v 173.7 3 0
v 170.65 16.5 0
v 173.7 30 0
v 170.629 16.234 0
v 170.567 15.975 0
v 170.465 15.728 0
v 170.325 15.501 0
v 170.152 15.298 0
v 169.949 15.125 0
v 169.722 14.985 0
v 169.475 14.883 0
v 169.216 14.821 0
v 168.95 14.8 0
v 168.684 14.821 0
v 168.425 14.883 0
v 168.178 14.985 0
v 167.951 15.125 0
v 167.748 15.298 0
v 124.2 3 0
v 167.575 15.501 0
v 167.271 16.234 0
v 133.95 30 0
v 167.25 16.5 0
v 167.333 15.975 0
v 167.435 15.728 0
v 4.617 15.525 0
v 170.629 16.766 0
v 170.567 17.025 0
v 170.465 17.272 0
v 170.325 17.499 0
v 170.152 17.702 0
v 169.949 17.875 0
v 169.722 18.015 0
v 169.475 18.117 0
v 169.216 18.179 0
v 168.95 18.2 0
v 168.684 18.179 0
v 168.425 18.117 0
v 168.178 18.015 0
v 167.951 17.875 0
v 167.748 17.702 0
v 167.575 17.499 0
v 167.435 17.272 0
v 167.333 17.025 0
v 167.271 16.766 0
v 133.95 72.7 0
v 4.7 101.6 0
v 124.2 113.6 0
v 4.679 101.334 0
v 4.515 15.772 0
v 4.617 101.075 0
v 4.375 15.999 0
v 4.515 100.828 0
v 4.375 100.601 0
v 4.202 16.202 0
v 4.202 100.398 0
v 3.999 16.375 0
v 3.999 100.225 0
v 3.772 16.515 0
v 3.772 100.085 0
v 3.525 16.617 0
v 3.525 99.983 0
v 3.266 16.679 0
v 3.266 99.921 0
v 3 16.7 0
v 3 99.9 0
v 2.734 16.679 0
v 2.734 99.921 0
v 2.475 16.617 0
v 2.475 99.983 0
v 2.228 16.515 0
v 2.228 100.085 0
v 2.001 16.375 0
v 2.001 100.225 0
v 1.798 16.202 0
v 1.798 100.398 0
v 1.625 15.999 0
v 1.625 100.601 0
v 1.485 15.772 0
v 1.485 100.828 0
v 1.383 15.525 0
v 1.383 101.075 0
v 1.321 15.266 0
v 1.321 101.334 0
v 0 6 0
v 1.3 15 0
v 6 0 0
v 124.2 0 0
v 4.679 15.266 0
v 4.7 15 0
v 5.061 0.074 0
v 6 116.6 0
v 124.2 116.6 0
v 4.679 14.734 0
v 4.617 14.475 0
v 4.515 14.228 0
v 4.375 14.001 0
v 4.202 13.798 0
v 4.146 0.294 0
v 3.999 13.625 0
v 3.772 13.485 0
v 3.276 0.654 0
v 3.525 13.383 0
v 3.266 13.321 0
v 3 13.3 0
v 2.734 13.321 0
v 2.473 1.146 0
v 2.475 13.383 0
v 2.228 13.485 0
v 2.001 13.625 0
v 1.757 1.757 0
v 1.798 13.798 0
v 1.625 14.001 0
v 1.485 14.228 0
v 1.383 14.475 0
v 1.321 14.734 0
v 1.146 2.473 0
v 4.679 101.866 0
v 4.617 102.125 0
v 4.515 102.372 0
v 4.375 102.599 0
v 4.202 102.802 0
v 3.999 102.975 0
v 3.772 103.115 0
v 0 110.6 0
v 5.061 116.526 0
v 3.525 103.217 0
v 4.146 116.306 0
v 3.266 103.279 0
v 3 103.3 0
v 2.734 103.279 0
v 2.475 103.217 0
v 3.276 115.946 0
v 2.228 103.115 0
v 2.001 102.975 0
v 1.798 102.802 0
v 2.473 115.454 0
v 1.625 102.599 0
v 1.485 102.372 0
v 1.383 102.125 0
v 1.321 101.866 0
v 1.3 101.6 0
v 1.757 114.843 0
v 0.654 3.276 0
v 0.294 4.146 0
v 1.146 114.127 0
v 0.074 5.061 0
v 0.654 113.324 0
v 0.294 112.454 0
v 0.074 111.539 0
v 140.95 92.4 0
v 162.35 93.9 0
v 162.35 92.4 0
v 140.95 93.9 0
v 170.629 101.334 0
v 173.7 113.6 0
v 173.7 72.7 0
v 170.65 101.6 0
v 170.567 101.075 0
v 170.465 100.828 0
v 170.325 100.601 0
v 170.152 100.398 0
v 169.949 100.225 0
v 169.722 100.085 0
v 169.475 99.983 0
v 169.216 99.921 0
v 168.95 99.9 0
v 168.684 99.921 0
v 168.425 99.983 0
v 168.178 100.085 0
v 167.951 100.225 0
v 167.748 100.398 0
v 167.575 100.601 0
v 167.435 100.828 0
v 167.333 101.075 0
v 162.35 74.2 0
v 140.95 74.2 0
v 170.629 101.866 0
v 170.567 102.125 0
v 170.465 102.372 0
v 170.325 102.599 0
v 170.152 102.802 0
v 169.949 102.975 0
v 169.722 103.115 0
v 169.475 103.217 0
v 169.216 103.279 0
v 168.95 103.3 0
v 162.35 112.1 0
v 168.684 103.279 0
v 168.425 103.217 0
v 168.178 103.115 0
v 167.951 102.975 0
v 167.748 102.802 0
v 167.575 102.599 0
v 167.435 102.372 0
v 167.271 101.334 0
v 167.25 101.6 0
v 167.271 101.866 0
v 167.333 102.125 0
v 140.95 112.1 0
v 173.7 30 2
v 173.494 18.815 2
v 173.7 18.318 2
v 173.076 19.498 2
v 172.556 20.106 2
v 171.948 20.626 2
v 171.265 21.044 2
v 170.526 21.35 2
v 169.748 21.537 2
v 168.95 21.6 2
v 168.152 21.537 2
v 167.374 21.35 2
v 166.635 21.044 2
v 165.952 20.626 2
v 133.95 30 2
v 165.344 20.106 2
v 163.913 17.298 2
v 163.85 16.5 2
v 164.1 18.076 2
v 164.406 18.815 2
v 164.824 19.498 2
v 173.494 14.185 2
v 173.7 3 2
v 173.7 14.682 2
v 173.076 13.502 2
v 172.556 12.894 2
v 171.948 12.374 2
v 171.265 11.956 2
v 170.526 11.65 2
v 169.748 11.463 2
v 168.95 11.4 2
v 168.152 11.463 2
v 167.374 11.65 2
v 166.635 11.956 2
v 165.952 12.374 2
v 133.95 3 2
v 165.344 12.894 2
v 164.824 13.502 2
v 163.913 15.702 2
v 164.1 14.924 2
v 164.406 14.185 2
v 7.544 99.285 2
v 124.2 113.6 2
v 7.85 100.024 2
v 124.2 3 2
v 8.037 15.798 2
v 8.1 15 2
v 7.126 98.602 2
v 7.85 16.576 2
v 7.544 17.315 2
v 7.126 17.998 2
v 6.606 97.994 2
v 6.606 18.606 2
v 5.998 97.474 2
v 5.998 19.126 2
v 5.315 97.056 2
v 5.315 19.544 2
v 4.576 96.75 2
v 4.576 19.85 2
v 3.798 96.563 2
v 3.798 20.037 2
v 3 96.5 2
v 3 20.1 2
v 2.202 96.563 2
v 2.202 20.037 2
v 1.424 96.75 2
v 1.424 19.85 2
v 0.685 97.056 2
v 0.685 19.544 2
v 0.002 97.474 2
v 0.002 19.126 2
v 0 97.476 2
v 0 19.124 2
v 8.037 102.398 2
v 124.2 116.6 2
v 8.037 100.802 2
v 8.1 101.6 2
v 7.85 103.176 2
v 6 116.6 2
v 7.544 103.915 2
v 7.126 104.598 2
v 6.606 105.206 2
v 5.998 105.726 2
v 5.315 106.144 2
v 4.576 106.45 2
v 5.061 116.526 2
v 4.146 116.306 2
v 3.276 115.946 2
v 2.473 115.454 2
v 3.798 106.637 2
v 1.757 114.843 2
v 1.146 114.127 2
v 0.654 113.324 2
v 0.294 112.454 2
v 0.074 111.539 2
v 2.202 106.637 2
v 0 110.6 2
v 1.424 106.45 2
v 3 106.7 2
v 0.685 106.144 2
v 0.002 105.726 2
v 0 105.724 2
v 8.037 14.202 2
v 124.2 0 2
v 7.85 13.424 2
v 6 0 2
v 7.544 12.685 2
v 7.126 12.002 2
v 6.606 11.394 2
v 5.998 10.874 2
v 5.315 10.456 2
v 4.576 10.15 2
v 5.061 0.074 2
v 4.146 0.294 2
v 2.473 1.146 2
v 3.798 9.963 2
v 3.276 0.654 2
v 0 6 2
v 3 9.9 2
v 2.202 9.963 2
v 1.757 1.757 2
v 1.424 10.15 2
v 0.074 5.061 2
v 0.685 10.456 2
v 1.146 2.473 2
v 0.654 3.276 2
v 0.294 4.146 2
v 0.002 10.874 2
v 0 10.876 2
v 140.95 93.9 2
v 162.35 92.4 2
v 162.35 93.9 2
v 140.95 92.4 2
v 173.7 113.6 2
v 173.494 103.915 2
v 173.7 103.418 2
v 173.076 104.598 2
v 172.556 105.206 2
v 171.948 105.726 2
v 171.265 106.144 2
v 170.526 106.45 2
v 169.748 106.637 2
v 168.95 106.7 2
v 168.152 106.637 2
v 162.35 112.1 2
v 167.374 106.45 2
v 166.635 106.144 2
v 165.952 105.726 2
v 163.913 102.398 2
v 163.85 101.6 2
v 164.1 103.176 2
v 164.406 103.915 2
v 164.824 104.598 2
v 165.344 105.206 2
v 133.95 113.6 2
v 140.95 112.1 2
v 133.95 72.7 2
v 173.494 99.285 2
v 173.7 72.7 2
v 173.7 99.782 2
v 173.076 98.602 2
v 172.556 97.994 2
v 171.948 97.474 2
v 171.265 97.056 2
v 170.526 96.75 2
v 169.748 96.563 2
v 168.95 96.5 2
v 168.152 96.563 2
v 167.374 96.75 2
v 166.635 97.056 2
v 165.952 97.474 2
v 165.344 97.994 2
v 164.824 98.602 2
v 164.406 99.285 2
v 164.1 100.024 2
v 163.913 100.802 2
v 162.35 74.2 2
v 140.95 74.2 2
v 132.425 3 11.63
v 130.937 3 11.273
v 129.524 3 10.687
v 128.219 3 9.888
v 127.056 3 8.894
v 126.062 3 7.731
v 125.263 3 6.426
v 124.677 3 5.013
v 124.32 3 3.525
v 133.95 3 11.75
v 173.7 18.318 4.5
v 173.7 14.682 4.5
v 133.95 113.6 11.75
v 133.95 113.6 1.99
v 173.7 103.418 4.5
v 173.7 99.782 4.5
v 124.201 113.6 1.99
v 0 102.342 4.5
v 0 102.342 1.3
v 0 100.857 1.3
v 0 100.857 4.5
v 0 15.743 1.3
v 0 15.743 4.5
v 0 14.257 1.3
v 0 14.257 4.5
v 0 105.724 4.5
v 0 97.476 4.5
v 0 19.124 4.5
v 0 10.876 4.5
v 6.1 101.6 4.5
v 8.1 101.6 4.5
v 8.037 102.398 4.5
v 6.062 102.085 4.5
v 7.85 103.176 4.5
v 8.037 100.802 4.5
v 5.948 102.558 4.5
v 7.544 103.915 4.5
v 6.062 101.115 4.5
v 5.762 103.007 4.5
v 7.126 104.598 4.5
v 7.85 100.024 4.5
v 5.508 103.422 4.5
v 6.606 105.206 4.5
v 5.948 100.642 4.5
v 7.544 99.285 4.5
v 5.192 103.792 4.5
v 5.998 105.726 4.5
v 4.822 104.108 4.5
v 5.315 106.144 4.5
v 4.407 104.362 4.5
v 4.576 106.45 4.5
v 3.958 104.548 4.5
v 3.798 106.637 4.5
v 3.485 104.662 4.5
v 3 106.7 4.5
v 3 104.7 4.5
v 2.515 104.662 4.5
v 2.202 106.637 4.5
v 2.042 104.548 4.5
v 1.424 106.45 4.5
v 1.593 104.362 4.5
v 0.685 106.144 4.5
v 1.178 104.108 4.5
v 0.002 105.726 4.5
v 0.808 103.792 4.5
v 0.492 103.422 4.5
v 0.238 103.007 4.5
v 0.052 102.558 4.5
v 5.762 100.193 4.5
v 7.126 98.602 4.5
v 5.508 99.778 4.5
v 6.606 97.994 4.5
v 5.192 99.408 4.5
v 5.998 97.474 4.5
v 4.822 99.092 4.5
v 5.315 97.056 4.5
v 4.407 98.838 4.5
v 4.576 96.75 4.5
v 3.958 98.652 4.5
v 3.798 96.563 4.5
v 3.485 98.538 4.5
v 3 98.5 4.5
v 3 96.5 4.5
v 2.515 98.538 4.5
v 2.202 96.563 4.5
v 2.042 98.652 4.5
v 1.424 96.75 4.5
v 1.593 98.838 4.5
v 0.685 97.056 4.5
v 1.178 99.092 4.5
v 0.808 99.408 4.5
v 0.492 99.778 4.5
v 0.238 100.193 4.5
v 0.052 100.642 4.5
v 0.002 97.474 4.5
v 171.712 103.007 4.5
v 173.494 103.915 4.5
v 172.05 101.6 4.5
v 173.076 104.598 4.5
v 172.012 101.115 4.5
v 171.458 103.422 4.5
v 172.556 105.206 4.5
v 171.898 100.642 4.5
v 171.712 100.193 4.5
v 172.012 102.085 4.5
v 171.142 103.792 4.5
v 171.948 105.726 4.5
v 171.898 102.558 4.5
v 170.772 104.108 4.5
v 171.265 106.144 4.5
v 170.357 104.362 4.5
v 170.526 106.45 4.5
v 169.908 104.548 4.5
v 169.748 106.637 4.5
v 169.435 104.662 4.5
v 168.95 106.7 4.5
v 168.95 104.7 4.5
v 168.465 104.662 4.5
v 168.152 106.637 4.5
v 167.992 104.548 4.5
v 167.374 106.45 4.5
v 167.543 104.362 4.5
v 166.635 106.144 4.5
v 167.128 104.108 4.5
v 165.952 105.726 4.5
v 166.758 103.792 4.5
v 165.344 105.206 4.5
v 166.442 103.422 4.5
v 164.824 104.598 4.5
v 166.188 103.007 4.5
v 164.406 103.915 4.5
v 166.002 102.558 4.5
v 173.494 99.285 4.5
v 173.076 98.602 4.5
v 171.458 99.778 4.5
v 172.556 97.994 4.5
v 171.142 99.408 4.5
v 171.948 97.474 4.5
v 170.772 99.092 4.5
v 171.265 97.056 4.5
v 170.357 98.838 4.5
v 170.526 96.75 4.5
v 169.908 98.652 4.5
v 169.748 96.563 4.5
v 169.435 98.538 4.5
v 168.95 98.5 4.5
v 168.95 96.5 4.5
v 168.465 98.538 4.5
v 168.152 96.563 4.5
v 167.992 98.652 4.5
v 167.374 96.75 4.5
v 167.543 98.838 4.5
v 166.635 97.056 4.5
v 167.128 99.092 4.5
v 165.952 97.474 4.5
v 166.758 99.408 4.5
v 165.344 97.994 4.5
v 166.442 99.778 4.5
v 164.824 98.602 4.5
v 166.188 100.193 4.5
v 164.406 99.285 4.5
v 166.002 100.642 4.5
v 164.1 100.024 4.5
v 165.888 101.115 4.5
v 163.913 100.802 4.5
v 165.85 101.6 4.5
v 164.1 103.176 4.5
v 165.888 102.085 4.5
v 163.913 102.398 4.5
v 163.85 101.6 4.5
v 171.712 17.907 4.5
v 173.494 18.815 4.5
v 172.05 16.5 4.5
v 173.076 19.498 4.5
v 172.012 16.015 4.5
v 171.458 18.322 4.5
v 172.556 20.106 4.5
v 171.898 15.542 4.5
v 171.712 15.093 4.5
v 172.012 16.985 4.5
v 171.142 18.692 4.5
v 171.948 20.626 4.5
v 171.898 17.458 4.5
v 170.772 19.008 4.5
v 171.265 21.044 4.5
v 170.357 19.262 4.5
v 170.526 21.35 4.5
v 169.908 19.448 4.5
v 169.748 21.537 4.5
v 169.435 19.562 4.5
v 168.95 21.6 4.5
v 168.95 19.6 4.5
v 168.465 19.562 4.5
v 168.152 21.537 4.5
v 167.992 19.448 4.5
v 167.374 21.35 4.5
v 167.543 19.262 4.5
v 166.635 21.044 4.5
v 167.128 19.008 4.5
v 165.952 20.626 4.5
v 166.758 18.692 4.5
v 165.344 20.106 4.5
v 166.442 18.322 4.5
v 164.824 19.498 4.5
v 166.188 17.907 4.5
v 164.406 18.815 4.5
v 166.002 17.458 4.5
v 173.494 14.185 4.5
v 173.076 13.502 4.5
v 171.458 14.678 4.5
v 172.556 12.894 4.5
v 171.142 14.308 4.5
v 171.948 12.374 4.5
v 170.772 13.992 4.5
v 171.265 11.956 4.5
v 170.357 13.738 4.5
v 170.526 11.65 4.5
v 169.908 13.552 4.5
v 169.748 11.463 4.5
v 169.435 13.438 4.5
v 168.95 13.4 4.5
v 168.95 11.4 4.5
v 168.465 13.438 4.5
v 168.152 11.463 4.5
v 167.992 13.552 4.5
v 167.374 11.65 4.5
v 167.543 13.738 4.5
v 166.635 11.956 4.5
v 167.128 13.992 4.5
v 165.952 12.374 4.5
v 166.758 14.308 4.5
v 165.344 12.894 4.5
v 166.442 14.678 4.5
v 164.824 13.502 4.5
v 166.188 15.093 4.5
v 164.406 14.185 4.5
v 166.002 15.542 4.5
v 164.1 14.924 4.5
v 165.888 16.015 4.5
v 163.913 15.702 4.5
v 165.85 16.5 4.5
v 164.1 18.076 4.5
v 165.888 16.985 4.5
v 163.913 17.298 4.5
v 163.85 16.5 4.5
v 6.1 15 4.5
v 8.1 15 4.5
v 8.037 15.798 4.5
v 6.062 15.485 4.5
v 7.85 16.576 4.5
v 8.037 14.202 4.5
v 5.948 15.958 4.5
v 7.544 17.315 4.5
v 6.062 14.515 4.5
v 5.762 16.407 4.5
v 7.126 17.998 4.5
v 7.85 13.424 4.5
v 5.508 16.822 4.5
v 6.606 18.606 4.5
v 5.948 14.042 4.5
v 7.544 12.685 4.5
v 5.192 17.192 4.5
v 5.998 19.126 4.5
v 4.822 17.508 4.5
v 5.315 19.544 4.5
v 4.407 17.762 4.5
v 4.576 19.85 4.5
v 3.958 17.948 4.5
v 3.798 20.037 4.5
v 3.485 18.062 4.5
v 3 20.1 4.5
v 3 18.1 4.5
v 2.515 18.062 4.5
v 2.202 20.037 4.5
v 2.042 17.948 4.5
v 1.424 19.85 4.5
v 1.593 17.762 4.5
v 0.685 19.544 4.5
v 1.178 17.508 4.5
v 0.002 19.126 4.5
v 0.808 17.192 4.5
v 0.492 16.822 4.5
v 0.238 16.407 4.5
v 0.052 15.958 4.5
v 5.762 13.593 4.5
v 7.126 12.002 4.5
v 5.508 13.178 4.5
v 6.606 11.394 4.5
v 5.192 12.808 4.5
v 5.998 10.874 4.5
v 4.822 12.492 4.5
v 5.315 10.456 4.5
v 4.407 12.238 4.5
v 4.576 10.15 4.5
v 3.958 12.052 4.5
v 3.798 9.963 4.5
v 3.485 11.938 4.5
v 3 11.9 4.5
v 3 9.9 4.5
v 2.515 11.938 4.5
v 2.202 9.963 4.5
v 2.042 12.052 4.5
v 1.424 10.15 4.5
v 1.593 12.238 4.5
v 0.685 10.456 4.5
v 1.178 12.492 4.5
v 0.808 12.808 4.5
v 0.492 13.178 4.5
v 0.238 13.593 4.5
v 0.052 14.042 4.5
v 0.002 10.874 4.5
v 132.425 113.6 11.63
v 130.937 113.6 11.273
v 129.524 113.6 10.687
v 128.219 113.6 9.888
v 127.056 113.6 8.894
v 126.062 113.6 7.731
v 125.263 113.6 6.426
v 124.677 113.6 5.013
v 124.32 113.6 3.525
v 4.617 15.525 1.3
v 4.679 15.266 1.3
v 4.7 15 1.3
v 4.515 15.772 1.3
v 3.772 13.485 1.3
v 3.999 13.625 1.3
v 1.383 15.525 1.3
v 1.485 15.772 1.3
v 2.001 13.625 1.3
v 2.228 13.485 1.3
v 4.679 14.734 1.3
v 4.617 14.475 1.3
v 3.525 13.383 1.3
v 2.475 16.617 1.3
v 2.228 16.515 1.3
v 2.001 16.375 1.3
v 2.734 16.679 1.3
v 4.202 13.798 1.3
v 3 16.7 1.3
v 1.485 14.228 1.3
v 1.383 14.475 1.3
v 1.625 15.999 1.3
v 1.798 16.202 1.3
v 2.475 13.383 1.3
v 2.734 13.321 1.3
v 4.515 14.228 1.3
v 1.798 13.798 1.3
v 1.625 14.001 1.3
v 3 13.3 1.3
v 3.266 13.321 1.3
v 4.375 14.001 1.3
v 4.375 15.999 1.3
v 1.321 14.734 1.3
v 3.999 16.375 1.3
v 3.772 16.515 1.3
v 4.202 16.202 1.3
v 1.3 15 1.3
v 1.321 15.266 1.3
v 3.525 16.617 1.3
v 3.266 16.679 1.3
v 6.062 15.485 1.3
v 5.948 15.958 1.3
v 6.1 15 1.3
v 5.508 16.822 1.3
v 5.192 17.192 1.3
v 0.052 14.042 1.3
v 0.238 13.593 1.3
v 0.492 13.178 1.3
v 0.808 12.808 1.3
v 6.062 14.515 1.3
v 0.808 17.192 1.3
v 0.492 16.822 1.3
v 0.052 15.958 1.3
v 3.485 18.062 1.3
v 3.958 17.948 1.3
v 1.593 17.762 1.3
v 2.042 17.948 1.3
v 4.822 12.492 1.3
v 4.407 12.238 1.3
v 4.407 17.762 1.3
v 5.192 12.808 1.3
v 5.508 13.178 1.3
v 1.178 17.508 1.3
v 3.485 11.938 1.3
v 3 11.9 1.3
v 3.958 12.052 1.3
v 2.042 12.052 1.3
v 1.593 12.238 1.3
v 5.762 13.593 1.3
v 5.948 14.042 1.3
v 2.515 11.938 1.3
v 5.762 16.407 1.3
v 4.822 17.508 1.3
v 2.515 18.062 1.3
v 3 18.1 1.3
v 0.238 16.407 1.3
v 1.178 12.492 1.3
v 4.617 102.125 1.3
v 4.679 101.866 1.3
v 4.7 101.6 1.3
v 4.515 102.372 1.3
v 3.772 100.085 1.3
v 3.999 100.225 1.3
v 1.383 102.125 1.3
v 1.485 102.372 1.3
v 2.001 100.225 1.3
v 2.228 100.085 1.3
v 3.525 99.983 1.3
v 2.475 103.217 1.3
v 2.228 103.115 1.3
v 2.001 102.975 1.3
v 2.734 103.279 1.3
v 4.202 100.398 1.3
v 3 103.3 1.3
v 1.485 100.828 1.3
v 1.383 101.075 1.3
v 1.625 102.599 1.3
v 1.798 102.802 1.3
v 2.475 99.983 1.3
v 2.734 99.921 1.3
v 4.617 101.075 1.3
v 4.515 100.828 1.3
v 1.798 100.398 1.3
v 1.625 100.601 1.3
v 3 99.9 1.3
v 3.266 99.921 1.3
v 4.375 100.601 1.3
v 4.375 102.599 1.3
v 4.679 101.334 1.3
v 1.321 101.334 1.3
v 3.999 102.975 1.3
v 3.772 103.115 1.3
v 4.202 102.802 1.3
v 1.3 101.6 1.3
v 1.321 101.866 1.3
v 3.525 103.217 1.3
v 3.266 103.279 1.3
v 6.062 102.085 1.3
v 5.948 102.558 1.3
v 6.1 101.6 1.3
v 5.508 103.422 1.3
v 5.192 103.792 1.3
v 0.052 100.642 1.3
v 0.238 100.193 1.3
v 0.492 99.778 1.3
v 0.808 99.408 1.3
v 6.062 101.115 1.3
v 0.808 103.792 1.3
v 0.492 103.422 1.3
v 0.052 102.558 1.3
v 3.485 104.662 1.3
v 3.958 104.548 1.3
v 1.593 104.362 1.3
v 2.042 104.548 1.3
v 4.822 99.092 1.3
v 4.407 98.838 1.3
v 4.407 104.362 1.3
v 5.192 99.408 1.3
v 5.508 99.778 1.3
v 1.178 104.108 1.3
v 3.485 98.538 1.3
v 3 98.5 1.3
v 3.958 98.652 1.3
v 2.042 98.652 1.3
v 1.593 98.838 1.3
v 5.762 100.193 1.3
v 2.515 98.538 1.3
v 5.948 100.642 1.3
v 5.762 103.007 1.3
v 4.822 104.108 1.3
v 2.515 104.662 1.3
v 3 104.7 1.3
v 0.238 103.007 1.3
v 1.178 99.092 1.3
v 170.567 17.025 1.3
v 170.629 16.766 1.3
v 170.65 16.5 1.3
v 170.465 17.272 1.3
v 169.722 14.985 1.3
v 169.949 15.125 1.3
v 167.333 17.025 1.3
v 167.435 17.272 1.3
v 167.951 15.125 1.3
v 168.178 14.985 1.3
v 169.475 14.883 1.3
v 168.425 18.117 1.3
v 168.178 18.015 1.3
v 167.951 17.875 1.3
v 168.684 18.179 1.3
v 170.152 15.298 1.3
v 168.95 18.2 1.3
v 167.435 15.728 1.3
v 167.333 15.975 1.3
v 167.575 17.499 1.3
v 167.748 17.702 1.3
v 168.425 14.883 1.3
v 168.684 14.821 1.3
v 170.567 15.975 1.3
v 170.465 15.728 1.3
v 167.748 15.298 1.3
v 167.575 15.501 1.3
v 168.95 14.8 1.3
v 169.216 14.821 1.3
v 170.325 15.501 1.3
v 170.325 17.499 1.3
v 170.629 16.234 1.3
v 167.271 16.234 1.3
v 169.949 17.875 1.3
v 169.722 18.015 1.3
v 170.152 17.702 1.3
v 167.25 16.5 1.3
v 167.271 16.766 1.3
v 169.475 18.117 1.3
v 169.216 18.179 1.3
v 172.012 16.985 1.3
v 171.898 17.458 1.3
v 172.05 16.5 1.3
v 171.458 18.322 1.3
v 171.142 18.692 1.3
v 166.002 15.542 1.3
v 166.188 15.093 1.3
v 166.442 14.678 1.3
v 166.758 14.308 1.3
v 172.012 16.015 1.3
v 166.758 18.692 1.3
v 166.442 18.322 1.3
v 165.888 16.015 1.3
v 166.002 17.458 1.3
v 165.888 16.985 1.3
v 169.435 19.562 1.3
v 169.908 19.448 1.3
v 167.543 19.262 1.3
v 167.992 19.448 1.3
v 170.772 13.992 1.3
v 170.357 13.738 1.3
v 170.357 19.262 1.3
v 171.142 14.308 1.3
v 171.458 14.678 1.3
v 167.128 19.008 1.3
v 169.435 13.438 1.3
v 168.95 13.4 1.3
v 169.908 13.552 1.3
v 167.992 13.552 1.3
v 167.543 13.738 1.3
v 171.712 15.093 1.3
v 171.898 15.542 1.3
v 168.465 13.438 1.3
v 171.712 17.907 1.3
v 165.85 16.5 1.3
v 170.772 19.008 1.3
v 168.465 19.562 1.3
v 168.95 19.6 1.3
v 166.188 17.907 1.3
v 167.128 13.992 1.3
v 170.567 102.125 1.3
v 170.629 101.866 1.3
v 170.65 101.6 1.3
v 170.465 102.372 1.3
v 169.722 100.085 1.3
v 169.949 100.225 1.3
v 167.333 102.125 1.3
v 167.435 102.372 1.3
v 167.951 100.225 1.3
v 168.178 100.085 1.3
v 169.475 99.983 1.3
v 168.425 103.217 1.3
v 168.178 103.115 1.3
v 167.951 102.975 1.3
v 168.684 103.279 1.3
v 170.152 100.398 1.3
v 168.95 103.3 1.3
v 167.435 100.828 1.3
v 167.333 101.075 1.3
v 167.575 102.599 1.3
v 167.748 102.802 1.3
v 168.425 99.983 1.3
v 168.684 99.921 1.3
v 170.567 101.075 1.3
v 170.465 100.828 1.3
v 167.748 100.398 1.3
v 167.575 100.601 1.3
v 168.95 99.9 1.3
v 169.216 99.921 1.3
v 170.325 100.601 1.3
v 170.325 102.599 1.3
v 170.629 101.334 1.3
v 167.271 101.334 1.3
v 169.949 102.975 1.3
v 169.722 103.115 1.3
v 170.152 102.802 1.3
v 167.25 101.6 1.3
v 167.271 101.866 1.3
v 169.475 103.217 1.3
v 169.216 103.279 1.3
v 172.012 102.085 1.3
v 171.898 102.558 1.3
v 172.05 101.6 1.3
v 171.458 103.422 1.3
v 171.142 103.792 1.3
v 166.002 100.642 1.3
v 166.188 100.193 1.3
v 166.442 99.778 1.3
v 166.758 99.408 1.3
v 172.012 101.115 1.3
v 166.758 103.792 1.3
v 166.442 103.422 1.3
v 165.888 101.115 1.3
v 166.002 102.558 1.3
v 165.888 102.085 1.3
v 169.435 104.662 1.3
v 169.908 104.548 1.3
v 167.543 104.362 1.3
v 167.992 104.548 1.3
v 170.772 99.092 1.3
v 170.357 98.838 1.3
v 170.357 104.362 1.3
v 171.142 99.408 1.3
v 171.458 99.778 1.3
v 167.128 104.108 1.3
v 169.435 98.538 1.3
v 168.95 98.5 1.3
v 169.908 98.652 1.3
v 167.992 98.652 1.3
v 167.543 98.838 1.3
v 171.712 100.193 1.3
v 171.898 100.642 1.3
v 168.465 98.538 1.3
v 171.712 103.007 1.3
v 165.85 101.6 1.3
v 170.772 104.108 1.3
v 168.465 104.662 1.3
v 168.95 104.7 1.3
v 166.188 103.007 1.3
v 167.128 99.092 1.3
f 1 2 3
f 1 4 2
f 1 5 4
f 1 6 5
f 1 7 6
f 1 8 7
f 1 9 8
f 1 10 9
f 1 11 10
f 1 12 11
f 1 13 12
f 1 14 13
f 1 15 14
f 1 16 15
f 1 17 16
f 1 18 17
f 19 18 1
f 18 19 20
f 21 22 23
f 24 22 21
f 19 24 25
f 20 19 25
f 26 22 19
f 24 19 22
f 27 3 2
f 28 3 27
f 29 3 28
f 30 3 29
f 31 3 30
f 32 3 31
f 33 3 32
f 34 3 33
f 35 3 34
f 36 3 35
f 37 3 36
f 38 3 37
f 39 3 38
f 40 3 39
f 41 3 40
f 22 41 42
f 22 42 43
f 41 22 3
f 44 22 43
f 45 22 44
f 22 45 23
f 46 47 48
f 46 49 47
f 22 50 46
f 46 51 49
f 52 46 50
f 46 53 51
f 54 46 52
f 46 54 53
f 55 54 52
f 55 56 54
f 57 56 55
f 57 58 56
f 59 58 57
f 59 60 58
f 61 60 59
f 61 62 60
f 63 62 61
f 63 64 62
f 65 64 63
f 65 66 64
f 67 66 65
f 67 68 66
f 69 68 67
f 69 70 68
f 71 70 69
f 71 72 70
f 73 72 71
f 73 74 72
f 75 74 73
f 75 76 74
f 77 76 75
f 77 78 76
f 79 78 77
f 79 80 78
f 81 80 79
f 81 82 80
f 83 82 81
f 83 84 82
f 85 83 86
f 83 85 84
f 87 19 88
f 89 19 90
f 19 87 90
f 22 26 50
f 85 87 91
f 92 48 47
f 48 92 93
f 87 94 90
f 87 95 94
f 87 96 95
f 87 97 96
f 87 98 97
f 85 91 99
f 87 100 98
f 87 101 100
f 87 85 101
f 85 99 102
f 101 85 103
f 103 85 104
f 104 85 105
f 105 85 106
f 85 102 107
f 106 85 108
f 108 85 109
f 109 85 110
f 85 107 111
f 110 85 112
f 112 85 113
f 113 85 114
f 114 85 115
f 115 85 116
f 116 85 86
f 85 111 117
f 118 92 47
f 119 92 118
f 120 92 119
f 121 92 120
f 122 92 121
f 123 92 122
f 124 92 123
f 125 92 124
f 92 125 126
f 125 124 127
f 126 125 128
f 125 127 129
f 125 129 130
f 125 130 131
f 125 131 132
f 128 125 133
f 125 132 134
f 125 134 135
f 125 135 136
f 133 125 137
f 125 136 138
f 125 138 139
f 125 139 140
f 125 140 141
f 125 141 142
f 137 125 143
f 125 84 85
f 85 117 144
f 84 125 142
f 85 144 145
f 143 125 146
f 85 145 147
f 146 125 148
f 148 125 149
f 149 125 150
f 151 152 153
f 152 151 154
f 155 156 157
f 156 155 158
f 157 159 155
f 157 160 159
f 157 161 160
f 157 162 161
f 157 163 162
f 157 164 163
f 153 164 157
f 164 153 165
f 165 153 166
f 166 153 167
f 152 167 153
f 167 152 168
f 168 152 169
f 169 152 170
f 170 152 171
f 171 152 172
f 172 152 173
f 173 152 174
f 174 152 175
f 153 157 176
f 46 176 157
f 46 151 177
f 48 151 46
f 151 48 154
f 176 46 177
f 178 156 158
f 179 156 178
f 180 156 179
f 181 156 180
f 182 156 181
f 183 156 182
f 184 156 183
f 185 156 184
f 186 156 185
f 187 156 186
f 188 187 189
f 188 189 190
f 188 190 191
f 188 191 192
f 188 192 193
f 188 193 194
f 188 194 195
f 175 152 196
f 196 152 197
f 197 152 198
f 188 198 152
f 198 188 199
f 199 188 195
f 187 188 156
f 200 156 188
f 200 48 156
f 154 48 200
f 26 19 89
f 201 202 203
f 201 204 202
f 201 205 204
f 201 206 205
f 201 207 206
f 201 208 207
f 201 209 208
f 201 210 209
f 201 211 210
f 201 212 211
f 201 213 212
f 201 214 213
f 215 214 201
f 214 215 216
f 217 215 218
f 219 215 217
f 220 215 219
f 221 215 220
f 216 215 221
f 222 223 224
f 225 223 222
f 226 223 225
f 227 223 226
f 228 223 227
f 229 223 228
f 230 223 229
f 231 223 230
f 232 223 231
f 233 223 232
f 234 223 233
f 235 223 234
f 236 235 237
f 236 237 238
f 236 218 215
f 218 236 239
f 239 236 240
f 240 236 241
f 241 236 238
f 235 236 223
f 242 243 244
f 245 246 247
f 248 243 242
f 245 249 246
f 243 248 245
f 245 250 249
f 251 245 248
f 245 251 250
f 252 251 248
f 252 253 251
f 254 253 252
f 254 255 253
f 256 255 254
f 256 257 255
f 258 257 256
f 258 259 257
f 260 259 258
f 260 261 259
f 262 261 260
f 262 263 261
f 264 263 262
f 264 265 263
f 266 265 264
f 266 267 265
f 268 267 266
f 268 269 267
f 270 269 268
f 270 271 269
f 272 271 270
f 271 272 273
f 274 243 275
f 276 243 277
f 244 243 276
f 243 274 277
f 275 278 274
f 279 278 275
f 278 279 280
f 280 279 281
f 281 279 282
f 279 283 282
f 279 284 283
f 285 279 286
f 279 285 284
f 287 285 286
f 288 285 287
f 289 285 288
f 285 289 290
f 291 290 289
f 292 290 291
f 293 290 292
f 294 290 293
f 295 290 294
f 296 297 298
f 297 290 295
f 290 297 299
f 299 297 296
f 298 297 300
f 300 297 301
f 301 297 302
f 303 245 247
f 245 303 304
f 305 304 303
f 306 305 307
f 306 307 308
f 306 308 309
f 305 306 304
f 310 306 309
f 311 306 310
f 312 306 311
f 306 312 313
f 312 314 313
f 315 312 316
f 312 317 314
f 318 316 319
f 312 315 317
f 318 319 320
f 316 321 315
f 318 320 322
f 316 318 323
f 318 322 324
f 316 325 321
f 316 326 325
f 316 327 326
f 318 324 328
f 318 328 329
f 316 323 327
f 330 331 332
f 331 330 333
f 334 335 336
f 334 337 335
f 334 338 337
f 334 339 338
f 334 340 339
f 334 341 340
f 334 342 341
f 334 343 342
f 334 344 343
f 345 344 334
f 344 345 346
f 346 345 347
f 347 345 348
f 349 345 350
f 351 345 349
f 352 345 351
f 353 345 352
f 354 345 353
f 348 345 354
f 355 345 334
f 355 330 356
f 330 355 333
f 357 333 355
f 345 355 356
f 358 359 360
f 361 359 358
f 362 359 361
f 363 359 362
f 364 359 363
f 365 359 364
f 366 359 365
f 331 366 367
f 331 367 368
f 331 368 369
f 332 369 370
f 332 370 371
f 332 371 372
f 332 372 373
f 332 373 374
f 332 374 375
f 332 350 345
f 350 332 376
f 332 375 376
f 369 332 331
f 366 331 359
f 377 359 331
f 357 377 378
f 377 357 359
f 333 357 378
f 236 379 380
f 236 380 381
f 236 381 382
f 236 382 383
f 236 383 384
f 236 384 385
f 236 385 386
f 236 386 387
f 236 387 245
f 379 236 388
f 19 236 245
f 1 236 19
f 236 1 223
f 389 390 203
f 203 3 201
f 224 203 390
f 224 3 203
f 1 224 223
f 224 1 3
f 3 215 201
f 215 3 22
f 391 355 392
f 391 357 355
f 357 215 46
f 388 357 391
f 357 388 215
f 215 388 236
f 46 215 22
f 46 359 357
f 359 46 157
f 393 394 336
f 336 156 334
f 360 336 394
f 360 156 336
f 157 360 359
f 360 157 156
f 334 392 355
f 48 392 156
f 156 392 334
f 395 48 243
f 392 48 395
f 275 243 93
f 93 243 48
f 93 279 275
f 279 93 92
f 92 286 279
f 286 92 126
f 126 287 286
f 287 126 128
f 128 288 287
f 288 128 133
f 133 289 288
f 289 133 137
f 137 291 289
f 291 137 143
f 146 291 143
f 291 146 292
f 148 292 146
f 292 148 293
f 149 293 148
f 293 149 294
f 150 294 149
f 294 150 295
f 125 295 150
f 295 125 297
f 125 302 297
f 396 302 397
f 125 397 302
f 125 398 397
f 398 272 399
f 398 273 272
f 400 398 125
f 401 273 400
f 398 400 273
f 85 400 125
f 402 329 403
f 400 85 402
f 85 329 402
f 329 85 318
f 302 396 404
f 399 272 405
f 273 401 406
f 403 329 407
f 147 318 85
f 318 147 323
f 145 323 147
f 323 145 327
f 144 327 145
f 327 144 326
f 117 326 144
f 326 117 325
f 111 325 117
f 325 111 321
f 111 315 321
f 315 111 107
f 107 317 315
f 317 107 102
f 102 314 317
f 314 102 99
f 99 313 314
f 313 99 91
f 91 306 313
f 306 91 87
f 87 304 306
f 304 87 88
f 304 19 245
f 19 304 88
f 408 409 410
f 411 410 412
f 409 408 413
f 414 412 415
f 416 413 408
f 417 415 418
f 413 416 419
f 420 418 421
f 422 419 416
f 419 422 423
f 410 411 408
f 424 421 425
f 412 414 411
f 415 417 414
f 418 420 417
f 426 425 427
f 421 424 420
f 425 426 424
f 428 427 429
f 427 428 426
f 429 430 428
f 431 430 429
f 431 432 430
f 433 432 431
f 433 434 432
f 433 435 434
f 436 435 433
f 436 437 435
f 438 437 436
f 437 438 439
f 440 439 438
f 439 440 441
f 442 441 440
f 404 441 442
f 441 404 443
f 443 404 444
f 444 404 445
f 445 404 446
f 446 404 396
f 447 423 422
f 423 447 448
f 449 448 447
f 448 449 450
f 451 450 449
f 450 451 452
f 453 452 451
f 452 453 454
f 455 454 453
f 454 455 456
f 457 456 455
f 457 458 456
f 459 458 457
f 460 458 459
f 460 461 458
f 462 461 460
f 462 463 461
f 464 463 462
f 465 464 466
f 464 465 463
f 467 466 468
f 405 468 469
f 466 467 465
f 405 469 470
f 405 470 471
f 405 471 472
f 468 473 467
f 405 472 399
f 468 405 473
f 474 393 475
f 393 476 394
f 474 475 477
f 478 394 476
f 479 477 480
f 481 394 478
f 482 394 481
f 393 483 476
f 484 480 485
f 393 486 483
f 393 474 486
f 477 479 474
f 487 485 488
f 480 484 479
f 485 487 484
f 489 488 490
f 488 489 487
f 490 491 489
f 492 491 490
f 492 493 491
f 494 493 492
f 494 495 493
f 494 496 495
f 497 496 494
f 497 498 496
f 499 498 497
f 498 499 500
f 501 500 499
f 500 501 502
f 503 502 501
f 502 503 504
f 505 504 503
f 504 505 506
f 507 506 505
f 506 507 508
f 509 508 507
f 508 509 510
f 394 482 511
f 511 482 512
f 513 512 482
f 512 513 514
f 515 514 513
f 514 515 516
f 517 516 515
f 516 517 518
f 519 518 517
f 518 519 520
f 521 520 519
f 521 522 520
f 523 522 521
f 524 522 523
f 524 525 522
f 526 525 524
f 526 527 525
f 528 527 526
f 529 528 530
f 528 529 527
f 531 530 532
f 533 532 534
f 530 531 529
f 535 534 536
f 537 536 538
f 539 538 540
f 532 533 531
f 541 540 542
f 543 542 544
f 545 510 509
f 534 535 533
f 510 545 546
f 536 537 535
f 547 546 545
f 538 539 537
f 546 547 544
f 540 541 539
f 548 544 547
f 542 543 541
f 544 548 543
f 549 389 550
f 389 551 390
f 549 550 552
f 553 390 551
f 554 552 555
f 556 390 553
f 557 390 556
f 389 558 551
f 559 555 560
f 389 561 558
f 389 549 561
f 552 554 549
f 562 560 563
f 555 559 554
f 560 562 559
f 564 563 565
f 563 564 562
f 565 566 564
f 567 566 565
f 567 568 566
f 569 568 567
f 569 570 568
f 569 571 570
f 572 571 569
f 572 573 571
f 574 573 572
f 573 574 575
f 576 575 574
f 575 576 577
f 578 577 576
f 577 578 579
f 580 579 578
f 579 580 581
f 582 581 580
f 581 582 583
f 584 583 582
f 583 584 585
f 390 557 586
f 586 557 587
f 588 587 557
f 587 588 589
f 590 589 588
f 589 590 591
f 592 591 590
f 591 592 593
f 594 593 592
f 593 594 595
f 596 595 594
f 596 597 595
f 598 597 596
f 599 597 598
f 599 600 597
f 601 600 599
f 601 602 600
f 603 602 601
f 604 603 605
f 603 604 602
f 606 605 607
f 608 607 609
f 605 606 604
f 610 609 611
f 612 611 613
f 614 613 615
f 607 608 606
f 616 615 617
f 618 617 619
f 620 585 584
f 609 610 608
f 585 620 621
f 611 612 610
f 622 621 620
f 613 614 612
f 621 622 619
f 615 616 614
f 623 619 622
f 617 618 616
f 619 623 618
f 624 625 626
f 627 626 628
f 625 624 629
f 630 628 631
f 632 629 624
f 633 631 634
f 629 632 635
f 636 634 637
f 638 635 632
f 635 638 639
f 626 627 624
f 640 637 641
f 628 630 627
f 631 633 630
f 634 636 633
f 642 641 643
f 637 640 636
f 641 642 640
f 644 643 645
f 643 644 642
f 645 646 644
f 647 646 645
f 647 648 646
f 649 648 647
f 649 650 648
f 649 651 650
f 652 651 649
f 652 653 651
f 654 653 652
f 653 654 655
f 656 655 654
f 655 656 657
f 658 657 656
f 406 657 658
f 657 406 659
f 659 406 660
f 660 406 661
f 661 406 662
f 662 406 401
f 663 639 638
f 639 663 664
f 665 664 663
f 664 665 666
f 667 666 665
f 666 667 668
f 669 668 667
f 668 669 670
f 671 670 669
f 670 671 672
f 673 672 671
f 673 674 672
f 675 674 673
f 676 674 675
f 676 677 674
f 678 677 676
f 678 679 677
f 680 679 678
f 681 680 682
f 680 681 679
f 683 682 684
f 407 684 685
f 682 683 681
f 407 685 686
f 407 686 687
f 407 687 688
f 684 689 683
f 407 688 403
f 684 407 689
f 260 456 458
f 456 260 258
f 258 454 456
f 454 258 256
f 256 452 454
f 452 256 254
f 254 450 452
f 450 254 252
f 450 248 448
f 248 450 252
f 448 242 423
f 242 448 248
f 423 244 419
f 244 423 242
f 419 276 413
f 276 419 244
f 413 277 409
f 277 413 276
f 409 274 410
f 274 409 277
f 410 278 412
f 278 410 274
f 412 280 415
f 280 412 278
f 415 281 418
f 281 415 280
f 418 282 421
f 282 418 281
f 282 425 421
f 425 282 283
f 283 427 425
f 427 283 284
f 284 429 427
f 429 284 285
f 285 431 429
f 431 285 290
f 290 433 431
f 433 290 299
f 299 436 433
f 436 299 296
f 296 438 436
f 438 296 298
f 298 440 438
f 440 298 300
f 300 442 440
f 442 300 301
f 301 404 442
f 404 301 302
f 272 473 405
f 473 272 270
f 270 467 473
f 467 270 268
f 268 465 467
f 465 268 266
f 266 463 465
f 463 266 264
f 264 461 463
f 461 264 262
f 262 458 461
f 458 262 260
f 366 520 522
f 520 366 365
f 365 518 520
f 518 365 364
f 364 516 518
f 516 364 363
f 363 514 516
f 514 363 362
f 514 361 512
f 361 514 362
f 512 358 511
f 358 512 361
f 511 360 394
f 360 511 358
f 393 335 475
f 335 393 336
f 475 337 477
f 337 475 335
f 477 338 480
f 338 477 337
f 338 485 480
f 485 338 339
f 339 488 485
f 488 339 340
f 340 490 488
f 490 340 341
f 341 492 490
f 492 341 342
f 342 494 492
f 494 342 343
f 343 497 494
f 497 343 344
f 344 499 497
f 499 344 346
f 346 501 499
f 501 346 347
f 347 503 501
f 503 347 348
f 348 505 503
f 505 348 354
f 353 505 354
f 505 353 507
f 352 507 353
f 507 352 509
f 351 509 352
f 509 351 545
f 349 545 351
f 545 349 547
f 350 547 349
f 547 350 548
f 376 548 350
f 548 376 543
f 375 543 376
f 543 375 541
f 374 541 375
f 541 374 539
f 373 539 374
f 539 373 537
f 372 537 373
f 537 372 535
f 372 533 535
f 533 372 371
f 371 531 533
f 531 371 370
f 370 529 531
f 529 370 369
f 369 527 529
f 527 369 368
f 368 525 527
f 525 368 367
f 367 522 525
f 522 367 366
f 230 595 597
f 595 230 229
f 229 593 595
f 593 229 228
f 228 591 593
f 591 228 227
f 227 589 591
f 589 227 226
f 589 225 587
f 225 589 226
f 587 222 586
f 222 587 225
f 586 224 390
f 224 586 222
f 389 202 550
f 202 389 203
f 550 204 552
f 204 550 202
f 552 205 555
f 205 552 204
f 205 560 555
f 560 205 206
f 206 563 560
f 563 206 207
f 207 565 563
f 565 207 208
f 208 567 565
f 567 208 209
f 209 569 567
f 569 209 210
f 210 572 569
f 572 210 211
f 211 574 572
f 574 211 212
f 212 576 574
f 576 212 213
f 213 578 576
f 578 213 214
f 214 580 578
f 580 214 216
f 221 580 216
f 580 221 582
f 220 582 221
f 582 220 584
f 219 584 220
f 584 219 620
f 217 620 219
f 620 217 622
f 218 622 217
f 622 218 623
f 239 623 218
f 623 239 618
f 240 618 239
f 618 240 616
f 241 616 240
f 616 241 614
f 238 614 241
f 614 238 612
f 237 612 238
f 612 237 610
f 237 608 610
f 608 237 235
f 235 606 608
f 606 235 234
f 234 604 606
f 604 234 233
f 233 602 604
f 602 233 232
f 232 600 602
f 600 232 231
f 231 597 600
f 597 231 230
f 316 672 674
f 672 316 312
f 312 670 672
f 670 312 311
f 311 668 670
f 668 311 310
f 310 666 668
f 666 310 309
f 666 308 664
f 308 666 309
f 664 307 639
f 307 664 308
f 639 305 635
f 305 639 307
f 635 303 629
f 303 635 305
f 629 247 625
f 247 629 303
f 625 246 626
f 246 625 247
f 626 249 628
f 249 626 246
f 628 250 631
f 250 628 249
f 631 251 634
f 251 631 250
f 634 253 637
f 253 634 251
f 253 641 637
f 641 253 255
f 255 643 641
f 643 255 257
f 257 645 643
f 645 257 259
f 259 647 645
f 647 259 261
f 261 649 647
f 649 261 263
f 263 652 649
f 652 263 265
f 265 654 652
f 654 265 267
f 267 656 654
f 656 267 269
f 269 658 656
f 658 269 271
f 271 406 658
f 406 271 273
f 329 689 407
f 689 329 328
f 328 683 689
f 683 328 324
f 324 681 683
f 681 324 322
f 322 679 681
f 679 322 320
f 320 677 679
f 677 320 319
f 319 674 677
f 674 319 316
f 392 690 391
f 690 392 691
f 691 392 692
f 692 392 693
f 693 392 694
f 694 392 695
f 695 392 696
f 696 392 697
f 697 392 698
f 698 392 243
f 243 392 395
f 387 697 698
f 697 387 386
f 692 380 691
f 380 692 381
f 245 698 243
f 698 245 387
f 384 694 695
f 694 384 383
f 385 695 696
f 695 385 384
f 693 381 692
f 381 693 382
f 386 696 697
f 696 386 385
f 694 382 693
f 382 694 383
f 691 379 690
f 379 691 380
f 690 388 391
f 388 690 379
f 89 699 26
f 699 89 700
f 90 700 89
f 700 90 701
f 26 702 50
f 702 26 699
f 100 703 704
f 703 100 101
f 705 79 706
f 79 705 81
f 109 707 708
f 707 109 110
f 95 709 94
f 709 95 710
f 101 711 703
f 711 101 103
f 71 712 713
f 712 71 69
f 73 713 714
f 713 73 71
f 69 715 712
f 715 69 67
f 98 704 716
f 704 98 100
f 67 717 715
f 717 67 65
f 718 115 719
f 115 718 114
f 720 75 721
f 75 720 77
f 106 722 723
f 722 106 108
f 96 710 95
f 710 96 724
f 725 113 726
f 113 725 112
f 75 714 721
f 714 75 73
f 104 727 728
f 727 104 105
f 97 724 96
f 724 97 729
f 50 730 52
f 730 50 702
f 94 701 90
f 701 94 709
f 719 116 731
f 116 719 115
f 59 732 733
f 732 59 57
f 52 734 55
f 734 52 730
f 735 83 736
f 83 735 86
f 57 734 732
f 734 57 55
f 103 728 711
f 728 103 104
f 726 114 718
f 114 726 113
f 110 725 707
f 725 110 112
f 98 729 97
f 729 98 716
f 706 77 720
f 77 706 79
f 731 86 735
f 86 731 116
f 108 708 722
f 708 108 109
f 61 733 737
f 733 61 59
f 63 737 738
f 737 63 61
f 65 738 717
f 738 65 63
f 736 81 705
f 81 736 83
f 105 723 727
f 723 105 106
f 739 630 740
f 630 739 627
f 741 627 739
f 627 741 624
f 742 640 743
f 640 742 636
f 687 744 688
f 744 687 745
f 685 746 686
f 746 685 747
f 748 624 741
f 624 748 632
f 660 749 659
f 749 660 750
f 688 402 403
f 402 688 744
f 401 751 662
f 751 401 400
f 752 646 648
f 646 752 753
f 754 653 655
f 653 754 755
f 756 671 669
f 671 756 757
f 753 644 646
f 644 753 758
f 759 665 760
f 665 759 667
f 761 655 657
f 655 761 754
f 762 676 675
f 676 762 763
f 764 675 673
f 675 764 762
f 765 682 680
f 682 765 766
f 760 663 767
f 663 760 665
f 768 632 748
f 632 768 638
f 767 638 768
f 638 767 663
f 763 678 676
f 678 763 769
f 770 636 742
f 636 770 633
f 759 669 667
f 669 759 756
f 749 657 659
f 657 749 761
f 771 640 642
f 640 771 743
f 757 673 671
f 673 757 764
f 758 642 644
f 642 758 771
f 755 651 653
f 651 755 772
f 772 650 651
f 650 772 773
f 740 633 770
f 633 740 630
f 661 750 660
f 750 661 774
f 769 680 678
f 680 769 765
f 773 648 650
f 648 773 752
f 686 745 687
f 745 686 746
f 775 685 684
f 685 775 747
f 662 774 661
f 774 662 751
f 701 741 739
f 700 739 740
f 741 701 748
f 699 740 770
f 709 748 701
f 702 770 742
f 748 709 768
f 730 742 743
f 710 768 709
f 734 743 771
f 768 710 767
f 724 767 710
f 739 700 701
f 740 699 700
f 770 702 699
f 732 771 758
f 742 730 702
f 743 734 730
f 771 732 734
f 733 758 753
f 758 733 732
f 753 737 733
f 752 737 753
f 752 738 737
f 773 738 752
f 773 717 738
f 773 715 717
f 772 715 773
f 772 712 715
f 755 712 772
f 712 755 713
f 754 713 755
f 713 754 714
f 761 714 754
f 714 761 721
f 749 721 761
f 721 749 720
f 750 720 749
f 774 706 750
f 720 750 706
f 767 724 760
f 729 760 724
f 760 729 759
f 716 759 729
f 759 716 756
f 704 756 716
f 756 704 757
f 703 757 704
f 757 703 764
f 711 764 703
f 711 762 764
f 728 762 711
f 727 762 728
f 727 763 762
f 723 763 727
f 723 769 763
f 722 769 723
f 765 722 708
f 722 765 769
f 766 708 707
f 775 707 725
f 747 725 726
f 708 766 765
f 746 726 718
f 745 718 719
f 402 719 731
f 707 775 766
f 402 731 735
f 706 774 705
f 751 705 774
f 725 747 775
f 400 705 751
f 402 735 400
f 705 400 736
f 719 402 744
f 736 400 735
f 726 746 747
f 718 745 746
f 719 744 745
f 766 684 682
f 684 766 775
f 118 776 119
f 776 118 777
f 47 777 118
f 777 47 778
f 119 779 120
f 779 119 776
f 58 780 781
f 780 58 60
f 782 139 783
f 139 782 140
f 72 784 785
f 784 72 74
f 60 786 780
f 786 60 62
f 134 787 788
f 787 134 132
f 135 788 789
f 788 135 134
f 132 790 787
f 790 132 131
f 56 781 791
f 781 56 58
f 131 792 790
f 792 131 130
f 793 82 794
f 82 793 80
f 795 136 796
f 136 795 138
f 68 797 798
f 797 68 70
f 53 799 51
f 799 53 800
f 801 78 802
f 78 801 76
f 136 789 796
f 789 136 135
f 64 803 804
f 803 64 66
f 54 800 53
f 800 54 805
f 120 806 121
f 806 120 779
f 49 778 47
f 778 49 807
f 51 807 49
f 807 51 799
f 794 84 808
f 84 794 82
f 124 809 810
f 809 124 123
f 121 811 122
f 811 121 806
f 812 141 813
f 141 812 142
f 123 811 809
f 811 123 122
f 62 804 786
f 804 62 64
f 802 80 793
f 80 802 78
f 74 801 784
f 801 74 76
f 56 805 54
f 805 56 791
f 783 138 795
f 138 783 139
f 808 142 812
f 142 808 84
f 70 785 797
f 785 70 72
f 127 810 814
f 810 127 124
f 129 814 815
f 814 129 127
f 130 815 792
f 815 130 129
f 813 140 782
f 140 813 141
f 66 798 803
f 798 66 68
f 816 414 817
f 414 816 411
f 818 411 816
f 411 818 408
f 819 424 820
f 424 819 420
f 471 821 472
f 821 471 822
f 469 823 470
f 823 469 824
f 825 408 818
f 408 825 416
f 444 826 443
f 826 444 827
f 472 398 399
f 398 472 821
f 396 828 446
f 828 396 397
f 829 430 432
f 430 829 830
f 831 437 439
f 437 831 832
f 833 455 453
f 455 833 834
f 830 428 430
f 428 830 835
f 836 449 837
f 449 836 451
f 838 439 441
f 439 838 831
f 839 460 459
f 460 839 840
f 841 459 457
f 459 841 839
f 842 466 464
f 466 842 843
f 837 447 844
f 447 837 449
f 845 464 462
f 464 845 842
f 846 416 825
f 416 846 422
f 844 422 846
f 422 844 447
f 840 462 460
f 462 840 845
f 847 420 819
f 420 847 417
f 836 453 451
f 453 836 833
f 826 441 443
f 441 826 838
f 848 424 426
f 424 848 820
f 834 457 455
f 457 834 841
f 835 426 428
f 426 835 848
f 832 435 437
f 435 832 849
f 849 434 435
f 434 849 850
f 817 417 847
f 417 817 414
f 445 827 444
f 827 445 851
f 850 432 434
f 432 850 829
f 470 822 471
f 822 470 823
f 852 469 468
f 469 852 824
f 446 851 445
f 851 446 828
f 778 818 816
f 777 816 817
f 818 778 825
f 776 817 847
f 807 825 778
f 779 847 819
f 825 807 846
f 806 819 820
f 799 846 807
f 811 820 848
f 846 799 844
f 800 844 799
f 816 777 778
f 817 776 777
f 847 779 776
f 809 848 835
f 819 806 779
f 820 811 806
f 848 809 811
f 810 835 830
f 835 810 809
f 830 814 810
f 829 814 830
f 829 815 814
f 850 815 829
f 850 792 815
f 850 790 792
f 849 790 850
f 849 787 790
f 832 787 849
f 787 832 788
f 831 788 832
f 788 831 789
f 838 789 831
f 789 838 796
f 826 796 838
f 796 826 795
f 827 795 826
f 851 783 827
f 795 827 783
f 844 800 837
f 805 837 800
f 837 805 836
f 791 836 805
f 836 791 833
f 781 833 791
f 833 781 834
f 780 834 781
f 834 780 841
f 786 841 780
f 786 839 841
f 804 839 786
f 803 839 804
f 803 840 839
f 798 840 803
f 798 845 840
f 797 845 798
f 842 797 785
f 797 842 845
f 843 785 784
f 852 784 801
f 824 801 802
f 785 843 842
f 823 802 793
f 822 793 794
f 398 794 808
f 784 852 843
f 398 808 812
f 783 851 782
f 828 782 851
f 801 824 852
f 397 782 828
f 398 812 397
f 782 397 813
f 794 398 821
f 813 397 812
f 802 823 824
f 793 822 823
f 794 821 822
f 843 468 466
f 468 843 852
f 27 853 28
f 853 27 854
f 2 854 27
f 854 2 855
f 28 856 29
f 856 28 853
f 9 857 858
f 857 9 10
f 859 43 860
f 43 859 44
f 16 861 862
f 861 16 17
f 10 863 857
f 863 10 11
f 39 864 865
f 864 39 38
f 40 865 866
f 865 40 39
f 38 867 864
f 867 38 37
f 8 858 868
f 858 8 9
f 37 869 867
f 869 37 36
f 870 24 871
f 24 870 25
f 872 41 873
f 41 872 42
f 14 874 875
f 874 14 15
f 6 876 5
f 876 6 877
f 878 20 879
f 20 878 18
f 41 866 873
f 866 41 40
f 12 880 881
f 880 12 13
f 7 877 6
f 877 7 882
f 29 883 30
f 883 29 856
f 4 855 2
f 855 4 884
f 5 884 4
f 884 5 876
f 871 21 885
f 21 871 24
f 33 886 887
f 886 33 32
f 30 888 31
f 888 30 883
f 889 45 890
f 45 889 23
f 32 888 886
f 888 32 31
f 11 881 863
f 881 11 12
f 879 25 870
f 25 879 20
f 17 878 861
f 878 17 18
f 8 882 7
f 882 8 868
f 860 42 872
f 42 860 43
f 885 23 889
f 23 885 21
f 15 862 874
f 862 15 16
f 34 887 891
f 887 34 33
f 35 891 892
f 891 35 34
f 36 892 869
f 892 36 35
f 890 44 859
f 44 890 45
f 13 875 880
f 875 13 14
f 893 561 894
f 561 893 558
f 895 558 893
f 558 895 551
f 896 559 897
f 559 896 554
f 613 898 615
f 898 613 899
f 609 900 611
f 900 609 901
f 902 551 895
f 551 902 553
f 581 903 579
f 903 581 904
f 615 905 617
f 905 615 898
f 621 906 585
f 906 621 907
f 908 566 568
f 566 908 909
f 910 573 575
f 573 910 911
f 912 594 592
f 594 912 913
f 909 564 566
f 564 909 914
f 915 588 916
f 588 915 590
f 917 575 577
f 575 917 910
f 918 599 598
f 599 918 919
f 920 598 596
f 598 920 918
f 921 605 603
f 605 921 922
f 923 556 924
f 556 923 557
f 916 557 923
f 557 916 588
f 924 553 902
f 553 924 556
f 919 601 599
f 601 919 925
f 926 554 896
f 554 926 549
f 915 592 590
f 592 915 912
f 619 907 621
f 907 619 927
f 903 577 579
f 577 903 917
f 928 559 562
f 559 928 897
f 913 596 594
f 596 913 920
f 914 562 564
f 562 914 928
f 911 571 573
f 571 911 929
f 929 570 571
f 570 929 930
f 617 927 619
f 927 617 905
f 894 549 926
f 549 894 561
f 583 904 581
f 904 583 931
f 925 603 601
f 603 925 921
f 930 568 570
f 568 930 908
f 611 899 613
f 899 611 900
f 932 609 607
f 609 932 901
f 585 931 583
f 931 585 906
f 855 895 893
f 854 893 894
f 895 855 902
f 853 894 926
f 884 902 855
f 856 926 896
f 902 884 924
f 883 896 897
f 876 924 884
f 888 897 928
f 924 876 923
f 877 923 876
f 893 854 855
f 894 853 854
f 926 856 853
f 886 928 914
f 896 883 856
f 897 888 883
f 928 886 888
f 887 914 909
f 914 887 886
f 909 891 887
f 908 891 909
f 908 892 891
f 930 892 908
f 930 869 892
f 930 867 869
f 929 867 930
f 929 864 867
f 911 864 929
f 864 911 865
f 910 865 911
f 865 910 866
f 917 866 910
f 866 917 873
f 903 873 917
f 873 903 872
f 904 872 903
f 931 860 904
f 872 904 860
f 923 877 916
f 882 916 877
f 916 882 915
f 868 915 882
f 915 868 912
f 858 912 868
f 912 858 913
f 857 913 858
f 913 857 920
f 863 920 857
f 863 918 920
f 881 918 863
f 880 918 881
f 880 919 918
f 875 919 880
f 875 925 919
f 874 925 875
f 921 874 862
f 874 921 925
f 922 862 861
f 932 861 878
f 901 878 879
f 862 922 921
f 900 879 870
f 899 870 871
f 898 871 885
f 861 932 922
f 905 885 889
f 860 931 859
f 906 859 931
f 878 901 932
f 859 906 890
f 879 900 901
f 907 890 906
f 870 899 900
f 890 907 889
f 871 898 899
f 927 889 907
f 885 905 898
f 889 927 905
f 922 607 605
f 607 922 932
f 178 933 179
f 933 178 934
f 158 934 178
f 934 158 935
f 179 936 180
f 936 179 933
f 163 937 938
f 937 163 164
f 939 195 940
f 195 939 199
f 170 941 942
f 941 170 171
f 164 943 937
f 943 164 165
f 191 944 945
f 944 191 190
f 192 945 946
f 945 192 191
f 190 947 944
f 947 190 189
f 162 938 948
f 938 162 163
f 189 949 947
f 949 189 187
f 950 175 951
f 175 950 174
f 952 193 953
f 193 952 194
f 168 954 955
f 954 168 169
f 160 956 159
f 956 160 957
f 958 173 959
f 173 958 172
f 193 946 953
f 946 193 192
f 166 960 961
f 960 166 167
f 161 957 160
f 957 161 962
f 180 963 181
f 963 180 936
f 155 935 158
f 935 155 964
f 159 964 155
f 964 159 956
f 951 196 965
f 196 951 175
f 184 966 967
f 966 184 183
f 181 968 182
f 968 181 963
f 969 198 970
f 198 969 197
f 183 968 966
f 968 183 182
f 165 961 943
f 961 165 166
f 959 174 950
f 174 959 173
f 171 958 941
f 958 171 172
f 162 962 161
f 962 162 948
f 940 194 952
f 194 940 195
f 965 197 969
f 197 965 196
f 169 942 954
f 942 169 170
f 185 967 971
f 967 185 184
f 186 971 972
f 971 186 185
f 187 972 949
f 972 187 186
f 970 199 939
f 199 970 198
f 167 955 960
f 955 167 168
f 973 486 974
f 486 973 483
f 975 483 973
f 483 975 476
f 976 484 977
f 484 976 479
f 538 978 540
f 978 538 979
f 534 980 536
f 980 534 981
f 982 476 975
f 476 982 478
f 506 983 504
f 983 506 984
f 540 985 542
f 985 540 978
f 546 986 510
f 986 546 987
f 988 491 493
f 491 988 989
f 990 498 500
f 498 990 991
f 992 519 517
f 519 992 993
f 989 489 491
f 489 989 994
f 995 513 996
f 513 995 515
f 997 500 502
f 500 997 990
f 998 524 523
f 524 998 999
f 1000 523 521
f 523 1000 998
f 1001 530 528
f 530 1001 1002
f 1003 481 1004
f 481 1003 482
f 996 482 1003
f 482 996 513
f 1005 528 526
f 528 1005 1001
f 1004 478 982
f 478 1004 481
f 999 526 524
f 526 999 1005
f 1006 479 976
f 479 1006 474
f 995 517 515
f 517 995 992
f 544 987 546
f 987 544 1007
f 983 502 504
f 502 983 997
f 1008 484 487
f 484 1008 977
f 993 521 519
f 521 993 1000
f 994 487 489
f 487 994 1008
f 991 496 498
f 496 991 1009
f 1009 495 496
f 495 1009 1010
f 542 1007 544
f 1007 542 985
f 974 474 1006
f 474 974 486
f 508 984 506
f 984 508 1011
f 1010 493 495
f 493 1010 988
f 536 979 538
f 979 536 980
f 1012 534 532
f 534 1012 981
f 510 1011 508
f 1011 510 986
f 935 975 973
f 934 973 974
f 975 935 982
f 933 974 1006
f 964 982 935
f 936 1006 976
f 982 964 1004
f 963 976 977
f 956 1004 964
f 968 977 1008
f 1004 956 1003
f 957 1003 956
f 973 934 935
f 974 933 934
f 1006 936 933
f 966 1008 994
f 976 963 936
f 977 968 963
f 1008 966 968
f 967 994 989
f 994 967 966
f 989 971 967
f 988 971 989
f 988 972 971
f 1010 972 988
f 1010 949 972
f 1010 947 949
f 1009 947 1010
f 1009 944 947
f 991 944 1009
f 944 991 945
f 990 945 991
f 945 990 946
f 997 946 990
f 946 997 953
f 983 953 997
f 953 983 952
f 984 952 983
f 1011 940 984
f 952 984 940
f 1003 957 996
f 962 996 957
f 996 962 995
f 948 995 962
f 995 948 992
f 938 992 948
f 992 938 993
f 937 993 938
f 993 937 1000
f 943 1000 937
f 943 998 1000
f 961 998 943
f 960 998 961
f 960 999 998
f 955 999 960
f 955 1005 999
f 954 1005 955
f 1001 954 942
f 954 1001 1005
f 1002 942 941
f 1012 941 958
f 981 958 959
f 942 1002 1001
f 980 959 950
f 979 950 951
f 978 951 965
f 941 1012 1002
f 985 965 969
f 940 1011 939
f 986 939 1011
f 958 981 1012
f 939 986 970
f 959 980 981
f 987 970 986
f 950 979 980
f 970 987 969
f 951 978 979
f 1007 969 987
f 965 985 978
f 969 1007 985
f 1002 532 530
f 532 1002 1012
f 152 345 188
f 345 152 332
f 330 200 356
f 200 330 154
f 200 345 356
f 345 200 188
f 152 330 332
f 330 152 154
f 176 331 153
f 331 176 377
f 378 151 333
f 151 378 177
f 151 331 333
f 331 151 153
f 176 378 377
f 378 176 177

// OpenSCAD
include <../lib/kobo-meshcore-case-lib.scad>;
$fn = 40;
back_plate();
